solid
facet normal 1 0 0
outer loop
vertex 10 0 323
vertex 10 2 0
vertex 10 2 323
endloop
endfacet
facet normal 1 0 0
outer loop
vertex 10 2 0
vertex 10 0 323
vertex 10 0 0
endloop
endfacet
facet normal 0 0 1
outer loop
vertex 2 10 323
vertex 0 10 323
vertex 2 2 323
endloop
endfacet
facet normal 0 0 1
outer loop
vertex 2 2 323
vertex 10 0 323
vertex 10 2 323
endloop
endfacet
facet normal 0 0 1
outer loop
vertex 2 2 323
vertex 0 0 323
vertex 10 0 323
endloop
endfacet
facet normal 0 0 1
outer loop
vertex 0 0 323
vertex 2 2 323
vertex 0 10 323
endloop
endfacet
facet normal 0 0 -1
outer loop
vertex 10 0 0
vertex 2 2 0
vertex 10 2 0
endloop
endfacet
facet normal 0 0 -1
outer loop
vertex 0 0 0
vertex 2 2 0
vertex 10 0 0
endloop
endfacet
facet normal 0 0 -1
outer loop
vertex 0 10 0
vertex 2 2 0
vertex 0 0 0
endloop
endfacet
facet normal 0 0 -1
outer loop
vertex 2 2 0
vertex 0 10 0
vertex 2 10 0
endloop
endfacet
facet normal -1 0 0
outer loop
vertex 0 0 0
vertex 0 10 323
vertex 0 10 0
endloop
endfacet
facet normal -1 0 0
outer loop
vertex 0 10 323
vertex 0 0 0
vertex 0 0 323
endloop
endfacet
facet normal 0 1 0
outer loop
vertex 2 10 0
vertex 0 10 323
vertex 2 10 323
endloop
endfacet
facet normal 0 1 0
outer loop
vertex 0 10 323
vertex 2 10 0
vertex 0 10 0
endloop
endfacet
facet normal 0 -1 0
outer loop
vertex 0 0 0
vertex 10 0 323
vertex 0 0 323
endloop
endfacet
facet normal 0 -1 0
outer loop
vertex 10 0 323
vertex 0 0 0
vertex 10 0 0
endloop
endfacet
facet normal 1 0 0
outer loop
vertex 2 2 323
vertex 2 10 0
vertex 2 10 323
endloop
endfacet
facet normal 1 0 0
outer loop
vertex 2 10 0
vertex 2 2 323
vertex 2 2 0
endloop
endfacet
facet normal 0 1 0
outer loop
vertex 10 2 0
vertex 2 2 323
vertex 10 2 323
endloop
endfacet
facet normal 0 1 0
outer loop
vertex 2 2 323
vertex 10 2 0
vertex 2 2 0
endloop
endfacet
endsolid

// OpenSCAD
wall_thickness = 2;

overhang = 10;
height = 323;

difference() {
    cube([overhang, overhang, height]);
    translate([wall_thickness, wall_thickness, 0]) {
        cube([overhang, overhang, height]);
    }
}
